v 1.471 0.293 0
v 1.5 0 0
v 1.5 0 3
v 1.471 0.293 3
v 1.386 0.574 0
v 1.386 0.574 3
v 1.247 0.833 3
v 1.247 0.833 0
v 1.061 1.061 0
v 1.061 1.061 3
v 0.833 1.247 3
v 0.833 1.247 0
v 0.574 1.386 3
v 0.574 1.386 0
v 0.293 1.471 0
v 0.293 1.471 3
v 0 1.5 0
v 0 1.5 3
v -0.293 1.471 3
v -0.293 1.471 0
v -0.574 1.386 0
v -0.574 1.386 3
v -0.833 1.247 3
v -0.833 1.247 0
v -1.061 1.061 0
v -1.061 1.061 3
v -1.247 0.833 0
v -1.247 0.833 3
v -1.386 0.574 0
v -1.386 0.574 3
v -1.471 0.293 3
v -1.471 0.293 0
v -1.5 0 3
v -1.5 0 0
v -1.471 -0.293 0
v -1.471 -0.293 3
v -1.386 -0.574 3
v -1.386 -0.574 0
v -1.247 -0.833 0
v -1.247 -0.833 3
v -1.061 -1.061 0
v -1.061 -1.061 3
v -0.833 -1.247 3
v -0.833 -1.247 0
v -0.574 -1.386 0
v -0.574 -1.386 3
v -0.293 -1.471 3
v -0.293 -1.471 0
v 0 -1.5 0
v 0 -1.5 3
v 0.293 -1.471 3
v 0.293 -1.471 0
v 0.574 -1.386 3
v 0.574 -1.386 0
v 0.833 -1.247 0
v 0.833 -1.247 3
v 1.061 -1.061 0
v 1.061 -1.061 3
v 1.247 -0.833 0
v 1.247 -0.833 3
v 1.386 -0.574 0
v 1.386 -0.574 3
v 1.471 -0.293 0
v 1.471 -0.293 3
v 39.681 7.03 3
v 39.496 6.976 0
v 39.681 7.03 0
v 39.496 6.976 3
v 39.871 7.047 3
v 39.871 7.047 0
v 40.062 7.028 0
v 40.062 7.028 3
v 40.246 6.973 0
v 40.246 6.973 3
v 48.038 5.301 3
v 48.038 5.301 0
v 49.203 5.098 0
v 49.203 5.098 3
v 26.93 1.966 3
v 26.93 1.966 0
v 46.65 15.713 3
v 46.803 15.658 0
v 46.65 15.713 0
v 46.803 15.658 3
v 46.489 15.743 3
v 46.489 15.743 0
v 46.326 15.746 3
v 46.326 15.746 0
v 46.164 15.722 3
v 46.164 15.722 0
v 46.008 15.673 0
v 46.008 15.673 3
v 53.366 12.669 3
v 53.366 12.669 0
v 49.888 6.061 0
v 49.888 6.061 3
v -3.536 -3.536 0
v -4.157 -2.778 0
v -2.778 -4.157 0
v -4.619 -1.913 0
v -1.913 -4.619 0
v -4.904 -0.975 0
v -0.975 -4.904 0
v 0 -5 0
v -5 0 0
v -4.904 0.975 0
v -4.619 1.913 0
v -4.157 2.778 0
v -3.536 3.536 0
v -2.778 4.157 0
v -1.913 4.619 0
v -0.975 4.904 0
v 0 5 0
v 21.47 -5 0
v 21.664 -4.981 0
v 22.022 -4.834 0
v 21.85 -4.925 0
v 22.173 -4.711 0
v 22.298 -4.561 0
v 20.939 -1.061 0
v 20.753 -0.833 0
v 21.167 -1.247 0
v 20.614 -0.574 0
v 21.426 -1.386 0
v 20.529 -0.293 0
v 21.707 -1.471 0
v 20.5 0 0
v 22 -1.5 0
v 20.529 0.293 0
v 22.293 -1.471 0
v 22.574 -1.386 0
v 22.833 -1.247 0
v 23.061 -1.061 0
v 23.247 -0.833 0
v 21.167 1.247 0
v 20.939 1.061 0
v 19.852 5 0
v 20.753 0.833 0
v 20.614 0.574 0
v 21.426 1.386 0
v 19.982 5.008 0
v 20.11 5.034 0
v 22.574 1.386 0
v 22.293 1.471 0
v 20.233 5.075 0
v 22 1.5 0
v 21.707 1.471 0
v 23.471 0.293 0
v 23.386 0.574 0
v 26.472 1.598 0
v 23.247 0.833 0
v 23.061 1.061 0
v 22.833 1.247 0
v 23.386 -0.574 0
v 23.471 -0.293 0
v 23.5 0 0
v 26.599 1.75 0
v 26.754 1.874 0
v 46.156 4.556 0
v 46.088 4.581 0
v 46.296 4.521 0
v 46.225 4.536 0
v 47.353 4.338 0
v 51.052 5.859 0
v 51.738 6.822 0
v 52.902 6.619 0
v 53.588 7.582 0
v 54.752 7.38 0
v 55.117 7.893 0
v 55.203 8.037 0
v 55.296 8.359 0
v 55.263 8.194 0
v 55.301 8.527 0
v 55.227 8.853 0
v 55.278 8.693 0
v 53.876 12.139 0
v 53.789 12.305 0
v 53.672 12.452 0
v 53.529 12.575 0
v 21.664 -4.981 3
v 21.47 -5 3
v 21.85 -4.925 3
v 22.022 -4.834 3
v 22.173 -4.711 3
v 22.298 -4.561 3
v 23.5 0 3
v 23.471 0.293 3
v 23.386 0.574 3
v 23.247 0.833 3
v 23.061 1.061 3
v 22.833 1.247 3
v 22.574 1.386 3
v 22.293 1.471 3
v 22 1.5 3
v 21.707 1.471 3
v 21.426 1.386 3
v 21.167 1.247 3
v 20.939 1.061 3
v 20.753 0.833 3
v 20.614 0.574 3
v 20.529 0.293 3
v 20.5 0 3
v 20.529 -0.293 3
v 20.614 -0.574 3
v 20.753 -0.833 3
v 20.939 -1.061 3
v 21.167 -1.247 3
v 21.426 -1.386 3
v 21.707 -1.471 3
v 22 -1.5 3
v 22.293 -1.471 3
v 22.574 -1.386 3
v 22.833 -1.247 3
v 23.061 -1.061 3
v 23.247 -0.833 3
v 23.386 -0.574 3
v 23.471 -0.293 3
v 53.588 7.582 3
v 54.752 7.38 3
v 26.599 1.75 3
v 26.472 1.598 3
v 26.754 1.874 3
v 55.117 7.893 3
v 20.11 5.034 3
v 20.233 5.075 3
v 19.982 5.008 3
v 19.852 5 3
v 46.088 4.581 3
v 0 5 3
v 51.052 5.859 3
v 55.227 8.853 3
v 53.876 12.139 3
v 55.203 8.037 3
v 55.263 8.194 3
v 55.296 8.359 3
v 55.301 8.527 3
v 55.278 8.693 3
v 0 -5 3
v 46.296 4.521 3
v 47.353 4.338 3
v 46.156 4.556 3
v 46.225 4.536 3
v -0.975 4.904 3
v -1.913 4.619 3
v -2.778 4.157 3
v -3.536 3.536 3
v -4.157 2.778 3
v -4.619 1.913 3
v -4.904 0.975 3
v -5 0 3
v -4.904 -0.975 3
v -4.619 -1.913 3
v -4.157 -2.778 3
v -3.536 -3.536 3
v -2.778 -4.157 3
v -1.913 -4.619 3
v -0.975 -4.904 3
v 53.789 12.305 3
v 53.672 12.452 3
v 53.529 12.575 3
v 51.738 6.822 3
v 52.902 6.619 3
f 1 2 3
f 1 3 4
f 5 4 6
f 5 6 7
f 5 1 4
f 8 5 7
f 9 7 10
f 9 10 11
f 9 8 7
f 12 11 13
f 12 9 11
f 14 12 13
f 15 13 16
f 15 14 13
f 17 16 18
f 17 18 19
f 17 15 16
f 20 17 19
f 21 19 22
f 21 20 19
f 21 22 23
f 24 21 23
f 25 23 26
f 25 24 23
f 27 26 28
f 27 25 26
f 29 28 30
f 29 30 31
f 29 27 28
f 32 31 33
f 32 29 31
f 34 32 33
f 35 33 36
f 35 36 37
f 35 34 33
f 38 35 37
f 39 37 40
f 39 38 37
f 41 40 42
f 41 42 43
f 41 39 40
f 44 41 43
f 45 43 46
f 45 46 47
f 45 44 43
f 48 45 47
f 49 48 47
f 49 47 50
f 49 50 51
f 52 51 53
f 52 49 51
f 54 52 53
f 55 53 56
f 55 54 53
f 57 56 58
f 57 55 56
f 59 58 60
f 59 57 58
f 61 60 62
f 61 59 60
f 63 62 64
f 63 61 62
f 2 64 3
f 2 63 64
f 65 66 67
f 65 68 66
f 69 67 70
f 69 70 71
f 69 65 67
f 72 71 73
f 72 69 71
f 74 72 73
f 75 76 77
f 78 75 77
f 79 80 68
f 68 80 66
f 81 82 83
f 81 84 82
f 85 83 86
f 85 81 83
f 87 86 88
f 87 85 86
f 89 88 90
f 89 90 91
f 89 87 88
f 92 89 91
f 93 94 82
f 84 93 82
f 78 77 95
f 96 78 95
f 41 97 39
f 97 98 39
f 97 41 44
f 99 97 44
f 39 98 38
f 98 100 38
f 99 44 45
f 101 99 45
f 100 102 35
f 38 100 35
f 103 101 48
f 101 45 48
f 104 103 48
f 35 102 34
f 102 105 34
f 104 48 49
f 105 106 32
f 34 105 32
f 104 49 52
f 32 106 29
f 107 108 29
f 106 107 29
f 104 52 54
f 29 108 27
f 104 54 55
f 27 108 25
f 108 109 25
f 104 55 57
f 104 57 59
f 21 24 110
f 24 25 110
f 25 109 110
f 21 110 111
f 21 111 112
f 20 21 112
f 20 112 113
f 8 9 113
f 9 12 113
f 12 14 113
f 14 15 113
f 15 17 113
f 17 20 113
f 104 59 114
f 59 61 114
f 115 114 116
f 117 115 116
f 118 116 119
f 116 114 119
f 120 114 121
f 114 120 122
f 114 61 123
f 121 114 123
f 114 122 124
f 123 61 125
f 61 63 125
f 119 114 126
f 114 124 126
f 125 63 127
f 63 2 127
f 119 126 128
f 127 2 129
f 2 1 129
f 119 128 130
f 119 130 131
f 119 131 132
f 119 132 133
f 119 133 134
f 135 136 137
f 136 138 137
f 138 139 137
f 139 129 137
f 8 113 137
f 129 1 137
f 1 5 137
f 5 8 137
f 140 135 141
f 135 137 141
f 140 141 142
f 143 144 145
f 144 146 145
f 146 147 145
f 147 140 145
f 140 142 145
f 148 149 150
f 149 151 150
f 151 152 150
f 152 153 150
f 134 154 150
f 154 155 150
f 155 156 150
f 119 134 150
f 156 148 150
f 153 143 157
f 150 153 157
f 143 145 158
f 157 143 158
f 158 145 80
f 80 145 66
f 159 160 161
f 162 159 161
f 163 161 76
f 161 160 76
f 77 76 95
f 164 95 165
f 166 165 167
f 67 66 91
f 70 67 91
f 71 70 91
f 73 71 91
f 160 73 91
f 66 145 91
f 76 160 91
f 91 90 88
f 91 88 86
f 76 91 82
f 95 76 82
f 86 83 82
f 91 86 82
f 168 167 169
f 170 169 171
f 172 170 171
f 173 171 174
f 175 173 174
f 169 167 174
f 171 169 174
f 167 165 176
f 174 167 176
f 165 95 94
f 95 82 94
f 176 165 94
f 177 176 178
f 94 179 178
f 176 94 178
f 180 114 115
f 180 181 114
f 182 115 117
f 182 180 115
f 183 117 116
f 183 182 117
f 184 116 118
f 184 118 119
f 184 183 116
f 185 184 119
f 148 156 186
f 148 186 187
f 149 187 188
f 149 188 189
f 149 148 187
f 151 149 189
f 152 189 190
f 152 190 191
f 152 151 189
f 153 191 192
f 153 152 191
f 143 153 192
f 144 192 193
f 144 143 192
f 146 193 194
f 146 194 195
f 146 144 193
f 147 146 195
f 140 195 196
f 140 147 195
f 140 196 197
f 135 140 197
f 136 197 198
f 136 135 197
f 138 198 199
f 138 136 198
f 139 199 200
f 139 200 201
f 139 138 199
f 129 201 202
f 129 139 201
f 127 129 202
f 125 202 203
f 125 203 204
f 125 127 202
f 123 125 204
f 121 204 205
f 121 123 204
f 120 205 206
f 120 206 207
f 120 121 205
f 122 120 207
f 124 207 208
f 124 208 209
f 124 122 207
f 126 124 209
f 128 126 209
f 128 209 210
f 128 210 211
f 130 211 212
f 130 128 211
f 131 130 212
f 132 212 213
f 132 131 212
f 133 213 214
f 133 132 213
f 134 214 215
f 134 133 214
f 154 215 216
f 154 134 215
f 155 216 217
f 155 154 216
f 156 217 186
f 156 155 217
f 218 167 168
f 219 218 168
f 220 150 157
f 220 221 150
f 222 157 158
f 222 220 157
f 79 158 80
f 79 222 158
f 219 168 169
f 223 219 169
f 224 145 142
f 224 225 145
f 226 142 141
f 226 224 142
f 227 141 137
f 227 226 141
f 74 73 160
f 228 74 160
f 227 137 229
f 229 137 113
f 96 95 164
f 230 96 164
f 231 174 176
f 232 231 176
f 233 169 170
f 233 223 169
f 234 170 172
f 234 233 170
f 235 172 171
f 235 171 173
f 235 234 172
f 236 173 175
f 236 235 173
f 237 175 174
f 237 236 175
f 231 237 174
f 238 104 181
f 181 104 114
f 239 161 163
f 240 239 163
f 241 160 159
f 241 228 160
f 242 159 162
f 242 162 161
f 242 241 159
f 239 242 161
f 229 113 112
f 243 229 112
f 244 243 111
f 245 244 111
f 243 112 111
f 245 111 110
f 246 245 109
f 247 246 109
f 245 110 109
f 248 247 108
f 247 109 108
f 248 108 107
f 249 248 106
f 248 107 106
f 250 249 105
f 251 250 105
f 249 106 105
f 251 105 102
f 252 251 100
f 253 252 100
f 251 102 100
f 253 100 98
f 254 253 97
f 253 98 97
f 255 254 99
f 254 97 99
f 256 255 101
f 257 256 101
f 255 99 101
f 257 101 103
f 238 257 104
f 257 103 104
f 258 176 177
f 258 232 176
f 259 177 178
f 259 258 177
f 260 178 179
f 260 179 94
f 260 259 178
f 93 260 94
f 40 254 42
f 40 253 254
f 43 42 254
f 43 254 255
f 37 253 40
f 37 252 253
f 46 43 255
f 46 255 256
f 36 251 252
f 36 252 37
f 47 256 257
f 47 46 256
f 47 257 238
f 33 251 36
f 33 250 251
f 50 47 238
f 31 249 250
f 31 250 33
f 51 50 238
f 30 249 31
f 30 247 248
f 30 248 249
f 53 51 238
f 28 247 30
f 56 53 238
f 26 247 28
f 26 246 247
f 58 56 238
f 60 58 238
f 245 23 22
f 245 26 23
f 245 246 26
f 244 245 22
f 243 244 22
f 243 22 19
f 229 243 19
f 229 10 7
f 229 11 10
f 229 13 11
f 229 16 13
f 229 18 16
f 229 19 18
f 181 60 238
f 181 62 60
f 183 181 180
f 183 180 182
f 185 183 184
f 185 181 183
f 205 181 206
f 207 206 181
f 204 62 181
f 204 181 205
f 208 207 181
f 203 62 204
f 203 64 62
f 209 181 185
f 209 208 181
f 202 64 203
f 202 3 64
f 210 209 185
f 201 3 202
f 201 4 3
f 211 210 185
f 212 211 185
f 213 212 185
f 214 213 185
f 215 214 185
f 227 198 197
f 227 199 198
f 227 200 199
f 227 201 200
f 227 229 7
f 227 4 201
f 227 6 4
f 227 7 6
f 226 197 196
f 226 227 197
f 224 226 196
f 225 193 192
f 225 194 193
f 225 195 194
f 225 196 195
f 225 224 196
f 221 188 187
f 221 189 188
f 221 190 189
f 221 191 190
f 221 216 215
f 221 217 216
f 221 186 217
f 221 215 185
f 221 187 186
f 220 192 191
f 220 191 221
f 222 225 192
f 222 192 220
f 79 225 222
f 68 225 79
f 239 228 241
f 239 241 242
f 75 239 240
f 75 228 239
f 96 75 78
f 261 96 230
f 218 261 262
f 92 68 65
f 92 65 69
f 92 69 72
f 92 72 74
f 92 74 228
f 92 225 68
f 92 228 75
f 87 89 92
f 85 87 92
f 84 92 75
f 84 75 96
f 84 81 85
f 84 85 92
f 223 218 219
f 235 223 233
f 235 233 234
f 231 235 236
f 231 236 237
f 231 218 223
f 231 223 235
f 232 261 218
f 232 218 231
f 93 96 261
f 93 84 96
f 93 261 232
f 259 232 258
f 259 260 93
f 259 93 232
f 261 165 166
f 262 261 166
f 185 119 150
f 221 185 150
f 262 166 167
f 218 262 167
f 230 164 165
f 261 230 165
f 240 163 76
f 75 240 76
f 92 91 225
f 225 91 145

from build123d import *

# Parameters (mm, degrees)
SKETCH1_R           = 1.5
BOSS_EXTRUDE1_DEPTH = 3
FILLET1_R           = 1


with BuildPart() as part:
    # Sketch1 → Boss-Extrude1 (new body)
    with BuildSketch(Plane.XY):
        with BuildLine():
            Line((20.05, 5), (0, 5))
            ThreePointArc((0, 5), (-5, 0), (0, -5))
            Line((0, -5), (22, -5))
            Line((22, -5), (26.644435765, 1.851814361))
            ThreePointArc((26.644435765, 1.851814361), (24.805434743, 4.138784351), (22, 5))
            Line((22, 5), (20.05, 5))
        make_face()
        Circle(SKETCH1_R, mode=Mode.SUBTRACT)
        with Locations((22, 0)):
            Circle(SKETCH1_R, mode=Mode.SUBTRACT)
        with BuildLine():
            Line((46.409029503, 15.837507263), (20.05, 5))
            Line((20.05, 5), (22, 5))
            ThreePointArc((22, 5), (24.805434743, 4.138784351), (26.644435765, 1.851814361))
            Line((26.644435765, 1.851814361), (39.871788822, 7.125781662))
            Line((39.871788822, 7.125781662), (46.188488025, 4.540007042))
            Line((46.188488025, 4.540007042), (47.352932204, 4.337597171))
            Line((47.352932204, 4.337597171), (48.038244482, 5.300533868))
            Line((48.038244482, 5.300533868), (49.20268866, 5.098123997))
            Line((49.20268866, 5.098123997), (49.888000938, 6.061060693))
            Line((49.888000938, 6.061060693), (51.052445116, 5.858650822))
            Line((51.052445116, 5.858650822), (51.737757394, 6.821587519))
            Line((51.737757394, 6.821587519), (52.902201573, 6.619177648))
            Line((52.902201573, 6.619177648), (53.587513851, 7.582114344))
            Line((53.587513851, 7.582114344), (54.751958029, 7.379704473))
            Line((54.751958029, 7.379704473), (55.437270307, 8.34264117))
            Line((55.437270307, 8.34264117), (53.72608495, 12.504593197))
            Line((53.72608495, 12.504593197), (46.409029503, 15.837507263))
        make_face()
    extrude(amount=BOSS_EXTRUDE1_DEPTH)

    # Fillet1
    fillet1_edges = [part.edges().sort_by_distance(p)[0] for p in [
        (22, -5, 1.5),
        (20.05, 5, 1.5),
        (46.409029503, 15.837507263, 1.5),
        (53.72608495, 12.504593197, 1.5),
        (55.437270307, 8.34264117, 1.5),
        (46.188488025, 4.540007042, 1.5),
        (39.871788822, 7.125781662, 1.5),
        (26.644435765, 1.851814361, 1.5),
    ]]
    fillet(fillet1_edges, radius=FILLET1_R)


solid = part.part
